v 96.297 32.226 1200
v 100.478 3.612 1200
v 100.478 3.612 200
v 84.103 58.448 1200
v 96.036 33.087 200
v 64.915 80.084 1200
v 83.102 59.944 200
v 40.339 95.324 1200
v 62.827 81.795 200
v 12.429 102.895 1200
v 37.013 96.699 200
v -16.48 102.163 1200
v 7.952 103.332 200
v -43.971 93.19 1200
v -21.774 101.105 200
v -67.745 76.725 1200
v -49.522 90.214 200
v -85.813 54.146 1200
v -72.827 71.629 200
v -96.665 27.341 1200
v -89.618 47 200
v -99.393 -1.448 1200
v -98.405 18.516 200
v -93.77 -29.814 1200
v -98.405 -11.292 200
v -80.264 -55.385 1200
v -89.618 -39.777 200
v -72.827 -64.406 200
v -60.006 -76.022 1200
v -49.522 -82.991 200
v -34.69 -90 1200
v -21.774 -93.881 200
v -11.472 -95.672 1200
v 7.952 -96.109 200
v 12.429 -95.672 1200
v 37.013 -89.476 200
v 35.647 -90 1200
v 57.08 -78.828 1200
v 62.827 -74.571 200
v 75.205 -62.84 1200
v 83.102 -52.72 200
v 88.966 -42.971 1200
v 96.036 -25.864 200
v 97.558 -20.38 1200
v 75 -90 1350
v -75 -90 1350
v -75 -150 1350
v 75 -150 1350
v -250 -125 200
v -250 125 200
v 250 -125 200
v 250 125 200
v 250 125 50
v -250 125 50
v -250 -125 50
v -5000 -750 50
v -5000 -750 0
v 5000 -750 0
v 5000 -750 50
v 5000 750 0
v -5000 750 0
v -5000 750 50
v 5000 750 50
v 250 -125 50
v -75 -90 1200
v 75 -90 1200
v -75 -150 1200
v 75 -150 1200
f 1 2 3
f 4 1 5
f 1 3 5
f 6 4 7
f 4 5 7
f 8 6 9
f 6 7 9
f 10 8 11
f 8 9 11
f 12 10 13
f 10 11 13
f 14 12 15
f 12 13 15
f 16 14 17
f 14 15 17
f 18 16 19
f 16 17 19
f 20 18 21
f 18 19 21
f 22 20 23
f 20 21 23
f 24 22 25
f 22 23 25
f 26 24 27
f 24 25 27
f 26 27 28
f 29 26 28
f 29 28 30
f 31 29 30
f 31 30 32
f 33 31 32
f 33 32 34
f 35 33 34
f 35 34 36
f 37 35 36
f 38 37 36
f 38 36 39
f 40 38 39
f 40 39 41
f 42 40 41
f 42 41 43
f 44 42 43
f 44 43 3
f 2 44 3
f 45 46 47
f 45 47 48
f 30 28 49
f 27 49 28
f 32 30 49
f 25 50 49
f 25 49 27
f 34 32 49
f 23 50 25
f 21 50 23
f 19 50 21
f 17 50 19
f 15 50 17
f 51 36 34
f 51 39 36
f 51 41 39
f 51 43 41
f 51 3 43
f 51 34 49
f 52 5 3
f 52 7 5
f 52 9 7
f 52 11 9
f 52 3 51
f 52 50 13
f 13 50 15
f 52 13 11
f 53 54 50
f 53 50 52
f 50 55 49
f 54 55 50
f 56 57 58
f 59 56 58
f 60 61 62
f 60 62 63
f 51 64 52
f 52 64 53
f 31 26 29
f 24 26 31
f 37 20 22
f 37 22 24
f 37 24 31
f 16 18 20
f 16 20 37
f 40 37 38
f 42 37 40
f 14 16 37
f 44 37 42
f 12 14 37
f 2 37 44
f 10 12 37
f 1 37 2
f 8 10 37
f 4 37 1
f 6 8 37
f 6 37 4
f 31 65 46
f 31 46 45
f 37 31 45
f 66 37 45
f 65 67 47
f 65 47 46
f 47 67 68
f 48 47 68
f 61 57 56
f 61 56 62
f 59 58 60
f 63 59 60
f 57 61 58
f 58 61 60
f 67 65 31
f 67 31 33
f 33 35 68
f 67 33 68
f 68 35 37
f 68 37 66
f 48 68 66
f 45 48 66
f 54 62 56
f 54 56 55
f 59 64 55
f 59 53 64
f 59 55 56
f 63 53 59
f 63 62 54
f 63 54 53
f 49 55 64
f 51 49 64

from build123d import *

# Parameters (mm, degrees)
SKETCH_W     = 10000
SKETCH_H     = 1500
PAD_DEPTH    = 50
SKETCH001_W  = 500
SKETCH001_H  = 250
PAD001_DEPTH = 150
SKETCH002_R  = 100
PAD002_DEPTH = 1000
SKETCH003_W  = 150
SKETCH003_H  = 60
PAD003_DEPTH = 150


with BuildPart() as part:
    # Sketch → Pad (new body)
    with BuildSketch(Plane.XY):
        Rectangle(SKETCH_W, SKETCH_H)
    extrude(amount=PAD_DEPTH)

    # Sketch001 (on Face6 of Pad) → Pad001 (join)
    with BuildSketch(Plane.XY.offset(50)):
        Rectangle(SKETCH001_W, SKETCH001_H)
    extrude(amount=PAD001_DEPTH)

    # Sketch002 (on Face11 of Pad001) → Pad002 (join)
    with BuildSketch(Plane.XY.offset(200)):
        with Locations((0.478492, 3.611733)):
            Circle(SKETCH002_R)
    extrude(amount=PAD002_DEPTH)

    # Sketch003 (on Face13 of Pad002) → Pad003 (join)
    with BuildSketch(Plane.XY.offset(1200)):
        with Locations((0, -120)):
            Rectangle(SKETCH003_W, SKETCH003_H)
    extrude(amount=PAD003_DEPTH)


solid = part.part
